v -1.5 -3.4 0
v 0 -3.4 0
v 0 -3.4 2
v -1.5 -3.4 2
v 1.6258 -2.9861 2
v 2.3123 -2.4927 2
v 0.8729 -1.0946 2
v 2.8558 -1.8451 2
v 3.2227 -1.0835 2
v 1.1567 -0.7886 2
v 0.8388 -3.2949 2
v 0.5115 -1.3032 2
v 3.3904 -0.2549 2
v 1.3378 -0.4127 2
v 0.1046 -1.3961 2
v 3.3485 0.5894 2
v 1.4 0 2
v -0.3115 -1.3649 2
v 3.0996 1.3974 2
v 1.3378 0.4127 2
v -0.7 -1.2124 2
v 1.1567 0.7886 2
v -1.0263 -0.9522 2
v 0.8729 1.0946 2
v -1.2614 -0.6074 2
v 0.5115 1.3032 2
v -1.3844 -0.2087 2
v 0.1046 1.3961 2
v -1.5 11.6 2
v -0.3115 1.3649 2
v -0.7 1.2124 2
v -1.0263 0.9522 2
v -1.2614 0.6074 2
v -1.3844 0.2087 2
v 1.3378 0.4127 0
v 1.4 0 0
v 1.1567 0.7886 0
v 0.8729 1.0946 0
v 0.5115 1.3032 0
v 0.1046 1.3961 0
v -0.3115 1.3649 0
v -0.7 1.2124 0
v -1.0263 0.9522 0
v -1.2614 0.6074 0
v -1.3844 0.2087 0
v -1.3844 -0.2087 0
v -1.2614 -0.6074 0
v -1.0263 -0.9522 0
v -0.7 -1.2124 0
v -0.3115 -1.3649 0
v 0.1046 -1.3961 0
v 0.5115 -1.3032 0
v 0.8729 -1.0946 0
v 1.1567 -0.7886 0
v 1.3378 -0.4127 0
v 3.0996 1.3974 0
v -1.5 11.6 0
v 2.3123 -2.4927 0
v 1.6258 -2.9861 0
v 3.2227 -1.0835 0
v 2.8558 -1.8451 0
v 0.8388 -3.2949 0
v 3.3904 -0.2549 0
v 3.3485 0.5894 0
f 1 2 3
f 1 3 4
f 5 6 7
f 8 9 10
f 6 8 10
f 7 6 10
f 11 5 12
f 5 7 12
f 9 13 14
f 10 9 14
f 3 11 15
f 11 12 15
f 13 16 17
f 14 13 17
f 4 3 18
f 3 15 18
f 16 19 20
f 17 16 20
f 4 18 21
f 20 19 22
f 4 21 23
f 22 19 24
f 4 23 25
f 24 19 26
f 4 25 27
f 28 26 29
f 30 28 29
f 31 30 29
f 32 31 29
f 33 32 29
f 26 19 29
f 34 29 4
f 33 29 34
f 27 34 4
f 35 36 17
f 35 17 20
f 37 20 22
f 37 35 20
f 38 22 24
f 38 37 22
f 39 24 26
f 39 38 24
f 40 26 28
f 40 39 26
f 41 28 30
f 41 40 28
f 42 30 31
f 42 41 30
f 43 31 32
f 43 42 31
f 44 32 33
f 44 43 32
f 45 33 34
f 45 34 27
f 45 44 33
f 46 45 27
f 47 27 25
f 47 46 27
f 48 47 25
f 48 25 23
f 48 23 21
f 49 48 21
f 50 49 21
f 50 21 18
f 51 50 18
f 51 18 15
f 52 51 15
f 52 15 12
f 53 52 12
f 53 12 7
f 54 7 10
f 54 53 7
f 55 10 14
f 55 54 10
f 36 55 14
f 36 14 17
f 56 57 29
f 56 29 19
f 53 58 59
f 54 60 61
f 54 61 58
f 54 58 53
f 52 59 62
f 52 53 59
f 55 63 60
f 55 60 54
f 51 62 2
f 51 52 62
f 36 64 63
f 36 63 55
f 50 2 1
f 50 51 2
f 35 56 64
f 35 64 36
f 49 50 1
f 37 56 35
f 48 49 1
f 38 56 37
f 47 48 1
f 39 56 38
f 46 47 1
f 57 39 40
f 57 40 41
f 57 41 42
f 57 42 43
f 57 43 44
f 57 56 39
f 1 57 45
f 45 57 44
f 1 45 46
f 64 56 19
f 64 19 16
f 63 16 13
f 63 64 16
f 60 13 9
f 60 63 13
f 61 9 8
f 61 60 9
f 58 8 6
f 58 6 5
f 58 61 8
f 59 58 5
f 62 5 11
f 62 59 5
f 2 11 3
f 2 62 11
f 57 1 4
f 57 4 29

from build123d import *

# Parameters (mm, degrees)
SKETCH1_R           = 1.4
BOSS_EXTRUDE1_DEPTH = 2


with BuildPart() as part:
    # Sketch1 → Boss-Extrude1 (new body)
    with BuildSketch(Plane.XY):
        with BuildLine():
            Line((-1.5, -3.4), (-1.5, -1.4))
            Line((-1.5, -1.4), (-1.5, 3.6))
            Line((-1.5, 3.6), (-1.5, 11.6))
            Line((-1.5, 11.6), (3.099578521, 1.397359292))
            ThreePointArc((3.099578521, 1.397359292), (2.855785495, -1.845125796), (0, -3.4))
            Line((0, -3.4), (-1.5, -3.4))
        make_face()
        Circle(SKETCH1_R, mode=Mode.SUBTRACT)
    extrude(amount=BOSS_EXTRUDE1_DEPTH)


solid = part.part
